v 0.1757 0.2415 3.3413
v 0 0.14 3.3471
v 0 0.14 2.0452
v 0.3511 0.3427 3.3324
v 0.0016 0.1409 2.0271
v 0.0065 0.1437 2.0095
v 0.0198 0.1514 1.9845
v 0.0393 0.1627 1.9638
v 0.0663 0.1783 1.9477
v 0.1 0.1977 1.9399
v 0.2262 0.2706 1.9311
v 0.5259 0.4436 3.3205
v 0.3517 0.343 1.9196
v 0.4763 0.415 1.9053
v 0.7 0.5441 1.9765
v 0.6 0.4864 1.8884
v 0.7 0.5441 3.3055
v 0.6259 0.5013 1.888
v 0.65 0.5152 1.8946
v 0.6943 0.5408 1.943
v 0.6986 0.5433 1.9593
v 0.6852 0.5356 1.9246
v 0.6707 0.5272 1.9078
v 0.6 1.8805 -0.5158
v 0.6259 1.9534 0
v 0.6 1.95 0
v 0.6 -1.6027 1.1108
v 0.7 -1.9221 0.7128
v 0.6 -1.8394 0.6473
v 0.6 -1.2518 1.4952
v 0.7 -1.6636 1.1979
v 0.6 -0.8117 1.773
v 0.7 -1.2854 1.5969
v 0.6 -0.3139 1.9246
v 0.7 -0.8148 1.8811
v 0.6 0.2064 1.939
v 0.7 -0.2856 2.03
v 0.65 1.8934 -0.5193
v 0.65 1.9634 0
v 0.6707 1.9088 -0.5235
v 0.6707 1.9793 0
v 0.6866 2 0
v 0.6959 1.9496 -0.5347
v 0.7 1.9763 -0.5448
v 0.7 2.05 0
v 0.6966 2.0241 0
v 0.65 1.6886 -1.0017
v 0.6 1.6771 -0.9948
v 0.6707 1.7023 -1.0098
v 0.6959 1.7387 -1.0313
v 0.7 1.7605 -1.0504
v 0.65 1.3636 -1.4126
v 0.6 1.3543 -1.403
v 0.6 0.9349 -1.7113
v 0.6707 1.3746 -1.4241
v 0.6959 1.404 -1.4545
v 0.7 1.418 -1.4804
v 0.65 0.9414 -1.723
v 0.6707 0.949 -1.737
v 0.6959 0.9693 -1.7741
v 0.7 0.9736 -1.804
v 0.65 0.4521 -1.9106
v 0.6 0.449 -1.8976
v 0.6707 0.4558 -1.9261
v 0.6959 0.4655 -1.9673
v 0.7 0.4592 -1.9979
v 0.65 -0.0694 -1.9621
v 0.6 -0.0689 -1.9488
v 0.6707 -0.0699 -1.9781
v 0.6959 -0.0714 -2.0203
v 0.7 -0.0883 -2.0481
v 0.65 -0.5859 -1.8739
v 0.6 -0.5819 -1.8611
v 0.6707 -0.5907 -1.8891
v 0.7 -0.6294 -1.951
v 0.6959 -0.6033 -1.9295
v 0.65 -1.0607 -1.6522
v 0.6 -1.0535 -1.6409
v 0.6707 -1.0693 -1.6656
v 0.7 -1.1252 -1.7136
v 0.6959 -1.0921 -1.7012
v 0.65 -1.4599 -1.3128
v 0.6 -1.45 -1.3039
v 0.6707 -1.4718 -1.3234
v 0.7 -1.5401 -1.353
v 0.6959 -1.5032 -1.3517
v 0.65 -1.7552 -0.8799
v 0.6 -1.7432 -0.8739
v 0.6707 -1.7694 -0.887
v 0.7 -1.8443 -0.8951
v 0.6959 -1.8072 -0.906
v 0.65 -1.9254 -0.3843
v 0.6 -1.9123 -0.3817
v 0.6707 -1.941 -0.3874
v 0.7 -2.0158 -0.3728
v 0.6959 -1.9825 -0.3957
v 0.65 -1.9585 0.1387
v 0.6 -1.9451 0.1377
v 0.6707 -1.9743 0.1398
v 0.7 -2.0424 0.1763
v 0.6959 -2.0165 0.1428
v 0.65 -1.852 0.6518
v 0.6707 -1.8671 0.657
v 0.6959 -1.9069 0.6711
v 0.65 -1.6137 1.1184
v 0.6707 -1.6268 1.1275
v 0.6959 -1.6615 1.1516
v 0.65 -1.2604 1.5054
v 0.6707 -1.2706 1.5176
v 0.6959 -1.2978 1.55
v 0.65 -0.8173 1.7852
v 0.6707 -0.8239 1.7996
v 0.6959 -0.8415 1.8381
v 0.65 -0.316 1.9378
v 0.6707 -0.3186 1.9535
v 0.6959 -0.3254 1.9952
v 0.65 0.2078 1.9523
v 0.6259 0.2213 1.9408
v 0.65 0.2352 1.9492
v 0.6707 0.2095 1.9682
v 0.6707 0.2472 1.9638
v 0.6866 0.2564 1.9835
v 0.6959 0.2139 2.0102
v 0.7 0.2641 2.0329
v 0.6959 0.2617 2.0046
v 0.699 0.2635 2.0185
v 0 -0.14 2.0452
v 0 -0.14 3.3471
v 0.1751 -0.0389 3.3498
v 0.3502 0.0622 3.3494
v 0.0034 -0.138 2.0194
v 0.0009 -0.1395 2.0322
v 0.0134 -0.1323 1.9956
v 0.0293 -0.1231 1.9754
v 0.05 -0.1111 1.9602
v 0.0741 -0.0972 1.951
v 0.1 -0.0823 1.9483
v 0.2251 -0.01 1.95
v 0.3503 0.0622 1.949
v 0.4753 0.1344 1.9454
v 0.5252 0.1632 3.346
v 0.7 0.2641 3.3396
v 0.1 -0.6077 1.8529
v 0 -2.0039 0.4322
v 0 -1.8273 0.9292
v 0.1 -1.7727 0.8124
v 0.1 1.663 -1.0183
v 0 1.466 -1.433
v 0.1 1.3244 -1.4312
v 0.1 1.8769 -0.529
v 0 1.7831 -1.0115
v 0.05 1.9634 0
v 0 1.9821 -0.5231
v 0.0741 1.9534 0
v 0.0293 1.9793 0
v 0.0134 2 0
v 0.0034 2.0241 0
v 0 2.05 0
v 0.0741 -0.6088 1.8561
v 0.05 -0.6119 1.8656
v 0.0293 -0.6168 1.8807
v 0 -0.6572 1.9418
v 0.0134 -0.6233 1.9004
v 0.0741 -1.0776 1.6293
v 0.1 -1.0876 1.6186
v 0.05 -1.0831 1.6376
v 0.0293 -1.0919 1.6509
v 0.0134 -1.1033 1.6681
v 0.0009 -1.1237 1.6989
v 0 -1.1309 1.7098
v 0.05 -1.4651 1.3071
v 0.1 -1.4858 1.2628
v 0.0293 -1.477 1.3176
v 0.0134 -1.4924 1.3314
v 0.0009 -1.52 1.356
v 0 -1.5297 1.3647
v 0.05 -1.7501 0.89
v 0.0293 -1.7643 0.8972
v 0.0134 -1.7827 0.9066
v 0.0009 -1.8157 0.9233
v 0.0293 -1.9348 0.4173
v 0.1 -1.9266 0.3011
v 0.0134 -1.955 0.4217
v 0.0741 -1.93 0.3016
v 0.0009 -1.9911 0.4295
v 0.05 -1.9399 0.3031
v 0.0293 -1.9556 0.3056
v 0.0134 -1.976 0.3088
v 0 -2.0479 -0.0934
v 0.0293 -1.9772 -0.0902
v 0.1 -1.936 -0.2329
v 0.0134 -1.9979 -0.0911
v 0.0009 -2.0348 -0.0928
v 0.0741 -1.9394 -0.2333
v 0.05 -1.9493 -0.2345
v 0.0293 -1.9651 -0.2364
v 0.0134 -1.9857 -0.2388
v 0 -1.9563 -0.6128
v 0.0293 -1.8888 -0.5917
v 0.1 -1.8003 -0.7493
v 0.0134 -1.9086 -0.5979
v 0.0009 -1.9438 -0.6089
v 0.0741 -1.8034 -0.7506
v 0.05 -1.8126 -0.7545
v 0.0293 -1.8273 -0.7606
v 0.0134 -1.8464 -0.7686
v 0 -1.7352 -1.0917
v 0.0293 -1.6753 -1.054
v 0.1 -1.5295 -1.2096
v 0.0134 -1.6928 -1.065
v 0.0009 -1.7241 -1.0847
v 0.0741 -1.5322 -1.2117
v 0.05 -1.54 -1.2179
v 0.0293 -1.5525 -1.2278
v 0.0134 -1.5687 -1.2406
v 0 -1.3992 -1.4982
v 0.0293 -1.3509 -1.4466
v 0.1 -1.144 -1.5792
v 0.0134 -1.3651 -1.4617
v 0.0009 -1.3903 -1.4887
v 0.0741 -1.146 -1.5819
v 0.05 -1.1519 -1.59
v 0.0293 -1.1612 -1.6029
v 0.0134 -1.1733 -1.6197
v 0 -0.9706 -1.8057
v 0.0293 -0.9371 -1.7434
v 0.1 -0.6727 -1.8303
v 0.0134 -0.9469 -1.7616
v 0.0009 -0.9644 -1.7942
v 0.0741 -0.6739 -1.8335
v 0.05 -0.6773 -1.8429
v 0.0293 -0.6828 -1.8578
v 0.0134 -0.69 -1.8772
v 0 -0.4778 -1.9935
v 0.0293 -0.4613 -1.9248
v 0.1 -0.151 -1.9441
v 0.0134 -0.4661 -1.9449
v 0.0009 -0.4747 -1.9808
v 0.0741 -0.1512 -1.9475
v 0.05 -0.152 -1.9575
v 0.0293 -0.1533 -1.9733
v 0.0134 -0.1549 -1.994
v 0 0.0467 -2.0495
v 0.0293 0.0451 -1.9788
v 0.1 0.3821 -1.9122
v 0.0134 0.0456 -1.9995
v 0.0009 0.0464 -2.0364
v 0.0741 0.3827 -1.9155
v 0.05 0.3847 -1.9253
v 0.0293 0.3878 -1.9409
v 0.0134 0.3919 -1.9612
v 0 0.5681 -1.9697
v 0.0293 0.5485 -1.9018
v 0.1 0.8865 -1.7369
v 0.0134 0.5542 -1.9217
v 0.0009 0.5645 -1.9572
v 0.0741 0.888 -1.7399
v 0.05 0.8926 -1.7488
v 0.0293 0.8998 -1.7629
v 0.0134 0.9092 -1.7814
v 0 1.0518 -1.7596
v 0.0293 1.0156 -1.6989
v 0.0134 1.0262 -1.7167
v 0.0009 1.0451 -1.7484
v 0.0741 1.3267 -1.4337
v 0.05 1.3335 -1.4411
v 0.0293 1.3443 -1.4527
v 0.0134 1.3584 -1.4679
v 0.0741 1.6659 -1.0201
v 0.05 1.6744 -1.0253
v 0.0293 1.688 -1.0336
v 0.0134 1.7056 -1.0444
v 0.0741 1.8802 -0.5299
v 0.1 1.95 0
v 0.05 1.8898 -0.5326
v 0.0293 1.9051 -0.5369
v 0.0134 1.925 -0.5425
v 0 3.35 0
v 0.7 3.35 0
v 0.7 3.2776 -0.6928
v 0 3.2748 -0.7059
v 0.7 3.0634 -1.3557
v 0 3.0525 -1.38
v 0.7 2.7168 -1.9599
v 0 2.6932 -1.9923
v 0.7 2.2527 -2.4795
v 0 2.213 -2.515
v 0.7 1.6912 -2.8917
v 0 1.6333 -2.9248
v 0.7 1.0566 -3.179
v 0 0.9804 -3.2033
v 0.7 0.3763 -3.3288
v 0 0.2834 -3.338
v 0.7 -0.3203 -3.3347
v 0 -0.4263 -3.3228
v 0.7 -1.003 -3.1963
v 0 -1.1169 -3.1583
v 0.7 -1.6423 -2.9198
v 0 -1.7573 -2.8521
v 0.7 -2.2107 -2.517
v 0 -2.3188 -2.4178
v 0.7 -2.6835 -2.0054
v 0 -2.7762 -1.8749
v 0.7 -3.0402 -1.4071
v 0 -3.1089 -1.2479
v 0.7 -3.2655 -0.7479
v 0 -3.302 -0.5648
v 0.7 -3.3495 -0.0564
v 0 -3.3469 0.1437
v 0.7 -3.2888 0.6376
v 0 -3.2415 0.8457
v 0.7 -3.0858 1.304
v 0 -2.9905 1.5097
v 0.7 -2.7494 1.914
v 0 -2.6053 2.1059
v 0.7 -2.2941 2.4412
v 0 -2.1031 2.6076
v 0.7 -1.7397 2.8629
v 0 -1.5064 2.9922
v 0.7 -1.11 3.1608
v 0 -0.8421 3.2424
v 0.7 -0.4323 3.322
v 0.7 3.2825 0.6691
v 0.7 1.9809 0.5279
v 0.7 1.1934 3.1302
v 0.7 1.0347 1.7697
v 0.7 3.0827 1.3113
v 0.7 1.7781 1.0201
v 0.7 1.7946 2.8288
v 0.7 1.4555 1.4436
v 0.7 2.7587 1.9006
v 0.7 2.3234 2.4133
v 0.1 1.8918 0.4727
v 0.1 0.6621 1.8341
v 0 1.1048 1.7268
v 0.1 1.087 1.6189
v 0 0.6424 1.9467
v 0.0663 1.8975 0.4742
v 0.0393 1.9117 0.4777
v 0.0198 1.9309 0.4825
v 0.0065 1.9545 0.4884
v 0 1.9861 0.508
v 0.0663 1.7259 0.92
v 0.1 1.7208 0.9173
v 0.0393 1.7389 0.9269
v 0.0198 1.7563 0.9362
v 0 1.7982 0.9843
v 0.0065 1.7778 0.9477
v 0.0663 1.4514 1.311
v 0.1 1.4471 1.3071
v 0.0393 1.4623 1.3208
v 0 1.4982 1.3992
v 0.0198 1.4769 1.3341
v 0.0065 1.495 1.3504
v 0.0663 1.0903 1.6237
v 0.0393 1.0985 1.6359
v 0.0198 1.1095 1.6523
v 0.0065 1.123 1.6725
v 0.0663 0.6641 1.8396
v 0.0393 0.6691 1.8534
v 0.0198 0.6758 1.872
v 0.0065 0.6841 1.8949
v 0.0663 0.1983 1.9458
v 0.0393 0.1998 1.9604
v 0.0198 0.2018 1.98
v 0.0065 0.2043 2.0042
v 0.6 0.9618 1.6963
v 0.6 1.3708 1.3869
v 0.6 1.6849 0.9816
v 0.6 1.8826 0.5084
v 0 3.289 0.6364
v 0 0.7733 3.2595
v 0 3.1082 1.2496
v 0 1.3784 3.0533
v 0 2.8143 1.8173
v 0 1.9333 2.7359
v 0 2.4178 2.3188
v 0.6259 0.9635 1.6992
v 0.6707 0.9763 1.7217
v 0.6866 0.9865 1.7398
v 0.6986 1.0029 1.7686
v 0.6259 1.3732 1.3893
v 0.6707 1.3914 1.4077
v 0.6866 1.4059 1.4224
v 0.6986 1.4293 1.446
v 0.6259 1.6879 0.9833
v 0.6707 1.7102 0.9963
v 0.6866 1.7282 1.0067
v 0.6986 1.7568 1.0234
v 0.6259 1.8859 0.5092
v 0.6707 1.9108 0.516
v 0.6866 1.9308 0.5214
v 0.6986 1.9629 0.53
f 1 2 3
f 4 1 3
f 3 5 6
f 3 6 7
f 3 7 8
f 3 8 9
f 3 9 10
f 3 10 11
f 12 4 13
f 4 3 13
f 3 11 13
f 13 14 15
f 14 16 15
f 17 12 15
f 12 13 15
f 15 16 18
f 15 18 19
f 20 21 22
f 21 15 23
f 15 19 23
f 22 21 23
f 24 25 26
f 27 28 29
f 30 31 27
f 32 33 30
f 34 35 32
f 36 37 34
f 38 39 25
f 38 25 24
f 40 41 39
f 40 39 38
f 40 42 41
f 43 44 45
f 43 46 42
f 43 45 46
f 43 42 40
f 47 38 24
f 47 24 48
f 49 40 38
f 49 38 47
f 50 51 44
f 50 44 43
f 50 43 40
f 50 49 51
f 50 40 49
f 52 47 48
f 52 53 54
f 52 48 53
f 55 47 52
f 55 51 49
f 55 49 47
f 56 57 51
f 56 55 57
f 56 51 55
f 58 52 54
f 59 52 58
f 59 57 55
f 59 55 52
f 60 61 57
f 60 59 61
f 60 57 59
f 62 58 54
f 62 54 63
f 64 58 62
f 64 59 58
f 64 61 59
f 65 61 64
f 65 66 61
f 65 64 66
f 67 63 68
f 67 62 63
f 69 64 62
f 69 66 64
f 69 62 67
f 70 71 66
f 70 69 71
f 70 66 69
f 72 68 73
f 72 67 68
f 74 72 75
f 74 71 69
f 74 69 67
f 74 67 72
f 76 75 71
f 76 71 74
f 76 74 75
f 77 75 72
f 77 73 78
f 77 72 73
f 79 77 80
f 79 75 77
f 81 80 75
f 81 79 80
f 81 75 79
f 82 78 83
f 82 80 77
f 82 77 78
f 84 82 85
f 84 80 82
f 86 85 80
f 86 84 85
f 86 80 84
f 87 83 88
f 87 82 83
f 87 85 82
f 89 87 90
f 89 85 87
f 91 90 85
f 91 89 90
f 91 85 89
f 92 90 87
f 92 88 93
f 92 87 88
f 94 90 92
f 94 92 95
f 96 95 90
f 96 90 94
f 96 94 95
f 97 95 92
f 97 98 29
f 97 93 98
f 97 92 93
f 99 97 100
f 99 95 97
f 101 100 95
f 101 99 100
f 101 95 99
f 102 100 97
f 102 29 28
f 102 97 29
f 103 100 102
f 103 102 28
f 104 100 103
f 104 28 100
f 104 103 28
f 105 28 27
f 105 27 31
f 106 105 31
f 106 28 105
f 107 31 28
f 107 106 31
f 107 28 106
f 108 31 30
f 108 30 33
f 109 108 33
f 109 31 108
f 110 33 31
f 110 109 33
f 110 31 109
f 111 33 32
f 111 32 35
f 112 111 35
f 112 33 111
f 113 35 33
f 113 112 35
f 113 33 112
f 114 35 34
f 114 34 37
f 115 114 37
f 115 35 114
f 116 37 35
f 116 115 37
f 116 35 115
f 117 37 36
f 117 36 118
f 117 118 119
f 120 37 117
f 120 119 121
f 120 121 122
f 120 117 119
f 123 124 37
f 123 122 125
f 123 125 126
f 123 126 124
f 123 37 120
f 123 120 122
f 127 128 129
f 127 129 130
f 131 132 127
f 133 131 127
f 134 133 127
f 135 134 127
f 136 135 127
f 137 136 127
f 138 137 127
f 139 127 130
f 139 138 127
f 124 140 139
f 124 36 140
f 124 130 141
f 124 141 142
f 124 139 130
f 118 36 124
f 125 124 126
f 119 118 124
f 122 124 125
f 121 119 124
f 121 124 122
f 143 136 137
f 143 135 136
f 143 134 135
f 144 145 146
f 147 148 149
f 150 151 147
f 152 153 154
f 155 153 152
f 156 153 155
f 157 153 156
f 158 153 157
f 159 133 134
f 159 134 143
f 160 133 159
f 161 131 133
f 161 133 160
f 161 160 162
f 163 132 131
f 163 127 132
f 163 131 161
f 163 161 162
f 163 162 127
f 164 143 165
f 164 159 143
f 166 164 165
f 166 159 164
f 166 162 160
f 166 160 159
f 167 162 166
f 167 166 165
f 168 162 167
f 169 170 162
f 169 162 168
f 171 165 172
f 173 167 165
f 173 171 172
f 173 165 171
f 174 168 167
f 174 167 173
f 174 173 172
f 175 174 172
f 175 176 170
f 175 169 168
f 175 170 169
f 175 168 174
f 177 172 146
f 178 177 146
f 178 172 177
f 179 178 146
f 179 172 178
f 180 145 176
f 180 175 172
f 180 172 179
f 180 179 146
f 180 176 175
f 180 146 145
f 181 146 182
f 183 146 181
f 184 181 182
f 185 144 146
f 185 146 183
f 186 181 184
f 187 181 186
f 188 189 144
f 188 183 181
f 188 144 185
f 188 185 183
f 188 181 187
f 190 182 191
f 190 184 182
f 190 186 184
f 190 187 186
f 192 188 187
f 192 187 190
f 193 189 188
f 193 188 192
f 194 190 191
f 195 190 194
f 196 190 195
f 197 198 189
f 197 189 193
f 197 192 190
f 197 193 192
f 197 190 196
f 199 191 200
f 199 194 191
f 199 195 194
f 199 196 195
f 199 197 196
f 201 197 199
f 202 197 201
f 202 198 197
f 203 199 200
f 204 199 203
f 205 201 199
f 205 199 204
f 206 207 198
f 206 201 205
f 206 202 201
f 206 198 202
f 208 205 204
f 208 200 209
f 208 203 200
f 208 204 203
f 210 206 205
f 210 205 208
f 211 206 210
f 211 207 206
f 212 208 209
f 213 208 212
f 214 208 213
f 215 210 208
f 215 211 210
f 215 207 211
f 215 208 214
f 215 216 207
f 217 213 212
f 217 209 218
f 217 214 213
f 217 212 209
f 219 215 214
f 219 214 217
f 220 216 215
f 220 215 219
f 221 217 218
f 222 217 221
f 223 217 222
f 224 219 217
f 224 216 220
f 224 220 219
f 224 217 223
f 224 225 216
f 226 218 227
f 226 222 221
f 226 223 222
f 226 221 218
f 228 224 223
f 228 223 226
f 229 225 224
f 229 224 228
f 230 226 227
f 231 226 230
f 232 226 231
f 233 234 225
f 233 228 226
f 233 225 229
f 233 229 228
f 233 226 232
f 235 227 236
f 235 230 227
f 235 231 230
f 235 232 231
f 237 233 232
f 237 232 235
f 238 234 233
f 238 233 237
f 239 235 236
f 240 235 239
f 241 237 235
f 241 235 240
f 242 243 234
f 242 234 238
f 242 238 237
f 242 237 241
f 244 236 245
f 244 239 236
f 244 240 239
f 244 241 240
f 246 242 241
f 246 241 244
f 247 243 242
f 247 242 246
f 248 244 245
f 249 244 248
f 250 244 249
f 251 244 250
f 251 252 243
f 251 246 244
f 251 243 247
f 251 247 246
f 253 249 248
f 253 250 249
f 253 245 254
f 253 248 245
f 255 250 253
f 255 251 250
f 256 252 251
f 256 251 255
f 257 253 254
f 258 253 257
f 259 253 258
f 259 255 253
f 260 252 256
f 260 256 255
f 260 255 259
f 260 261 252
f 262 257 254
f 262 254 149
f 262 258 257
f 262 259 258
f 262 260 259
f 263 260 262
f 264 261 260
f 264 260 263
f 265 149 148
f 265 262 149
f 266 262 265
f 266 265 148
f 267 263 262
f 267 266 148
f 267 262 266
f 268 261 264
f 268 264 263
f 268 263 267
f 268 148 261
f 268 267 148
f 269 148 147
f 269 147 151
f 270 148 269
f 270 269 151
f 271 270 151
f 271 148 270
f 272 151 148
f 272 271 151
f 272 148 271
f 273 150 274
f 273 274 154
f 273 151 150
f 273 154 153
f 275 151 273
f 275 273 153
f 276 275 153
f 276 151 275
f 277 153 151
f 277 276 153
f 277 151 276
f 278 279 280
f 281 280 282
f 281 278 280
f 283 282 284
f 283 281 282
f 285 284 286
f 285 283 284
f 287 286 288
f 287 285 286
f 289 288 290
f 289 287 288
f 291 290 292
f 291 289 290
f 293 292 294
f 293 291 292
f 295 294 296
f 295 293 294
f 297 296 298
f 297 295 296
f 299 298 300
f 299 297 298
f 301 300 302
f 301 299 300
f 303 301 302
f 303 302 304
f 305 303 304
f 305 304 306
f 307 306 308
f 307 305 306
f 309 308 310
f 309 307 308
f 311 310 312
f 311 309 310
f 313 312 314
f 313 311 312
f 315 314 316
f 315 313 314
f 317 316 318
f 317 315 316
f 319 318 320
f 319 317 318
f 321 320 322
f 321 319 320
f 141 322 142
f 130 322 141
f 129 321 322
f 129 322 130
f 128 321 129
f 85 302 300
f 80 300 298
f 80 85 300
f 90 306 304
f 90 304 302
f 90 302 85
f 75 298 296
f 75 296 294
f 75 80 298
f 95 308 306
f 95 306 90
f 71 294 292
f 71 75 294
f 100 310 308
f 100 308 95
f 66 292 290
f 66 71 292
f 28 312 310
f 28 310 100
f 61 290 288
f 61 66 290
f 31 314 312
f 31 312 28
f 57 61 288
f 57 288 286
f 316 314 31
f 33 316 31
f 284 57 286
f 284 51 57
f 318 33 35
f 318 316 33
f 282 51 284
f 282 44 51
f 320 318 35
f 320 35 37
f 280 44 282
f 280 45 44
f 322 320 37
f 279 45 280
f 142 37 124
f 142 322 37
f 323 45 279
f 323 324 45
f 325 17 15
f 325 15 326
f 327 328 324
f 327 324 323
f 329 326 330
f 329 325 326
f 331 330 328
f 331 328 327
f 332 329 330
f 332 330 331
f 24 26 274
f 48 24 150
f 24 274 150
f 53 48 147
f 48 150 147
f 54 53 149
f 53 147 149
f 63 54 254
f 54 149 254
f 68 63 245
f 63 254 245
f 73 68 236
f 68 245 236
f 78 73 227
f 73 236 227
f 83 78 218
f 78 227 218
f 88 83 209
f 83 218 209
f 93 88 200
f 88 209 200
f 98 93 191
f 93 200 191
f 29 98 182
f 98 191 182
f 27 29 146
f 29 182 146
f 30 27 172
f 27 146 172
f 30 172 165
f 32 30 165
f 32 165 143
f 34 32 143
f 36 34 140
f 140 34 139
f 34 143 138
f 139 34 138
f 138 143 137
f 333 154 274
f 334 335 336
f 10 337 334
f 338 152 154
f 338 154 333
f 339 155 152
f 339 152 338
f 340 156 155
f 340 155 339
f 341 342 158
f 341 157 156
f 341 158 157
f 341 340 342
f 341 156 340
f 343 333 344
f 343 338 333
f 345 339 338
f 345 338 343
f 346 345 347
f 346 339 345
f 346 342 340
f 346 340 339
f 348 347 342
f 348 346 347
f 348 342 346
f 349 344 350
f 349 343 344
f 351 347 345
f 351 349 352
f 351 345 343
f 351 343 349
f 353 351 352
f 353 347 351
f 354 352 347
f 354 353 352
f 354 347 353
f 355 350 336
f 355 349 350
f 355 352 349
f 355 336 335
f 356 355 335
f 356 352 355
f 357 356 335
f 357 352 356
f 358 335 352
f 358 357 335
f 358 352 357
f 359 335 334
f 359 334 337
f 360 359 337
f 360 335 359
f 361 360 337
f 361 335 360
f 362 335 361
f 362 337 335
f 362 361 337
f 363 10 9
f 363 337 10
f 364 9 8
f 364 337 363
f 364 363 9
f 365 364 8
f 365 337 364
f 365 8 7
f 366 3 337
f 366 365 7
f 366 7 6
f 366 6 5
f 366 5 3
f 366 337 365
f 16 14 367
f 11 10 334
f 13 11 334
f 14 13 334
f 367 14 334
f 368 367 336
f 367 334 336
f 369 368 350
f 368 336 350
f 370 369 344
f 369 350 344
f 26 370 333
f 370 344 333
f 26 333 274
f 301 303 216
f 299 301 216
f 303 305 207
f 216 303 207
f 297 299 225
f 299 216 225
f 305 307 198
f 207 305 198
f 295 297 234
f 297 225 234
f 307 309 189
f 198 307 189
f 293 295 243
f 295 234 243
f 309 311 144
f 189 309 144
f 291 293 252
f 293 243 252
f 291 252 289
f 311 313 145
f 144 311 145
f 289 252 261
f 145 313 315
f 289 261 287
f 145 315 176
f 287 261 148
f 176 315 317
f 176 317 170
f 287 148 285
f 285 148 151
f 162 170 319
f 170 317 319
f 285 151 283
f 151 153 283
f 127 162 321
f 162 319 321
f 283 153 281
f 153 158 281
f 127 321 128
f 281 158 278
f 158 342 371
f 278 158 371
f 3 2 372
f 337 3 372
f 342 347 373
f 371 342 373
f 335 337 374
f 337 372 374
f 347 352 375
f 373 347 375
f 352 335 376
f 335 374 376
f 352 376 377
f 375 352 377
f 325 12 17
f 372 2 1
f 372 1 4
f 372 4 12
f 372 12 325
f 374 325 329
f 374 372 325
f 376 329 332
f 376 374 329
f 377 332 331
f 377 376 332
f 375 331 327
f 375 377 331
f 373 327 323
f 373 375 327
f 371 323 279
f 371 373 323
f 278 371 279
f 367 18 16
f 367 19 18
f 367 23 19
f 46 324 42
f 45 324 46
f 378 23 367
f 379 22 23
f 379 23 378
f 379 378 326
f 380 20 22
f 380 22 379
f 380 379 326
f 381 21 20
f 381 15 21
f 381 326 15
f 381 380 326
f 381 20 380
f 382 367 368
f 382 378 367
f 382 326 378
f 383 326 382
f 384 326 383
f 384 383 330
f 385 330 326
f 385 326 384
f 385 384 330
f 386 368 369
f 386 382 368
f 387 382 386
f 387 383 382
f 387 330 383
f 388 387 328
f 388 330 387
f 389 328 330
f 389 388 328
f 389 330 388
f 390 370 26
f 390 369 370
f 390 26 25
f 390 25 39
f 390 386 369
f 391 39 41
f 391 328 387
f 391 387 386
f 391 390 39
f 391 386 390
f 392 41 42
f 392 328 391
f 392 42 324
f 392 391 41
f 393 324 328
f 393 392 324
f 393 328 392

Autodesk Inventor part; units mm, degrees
ref_plane "YZ Plane" through (0, 0, 0) normal (1, 0, 0) x (0, 1, 0)
ref_plane "XZ Plane" through (0, 0, 0) normal (0, 1, 0) x (-1, 0, 0)
sketch "Sketch1" plane through (0, 0, 0) normal (1, 0, 0) x (0, 1, 0)
  circle A0 centre (0, 0) radius 3.35
  circle A1 centre (0, 0) radius 1.95
  dimension "d0" = 3.9
  dimension "d1" = 6.7
extrude "Body" add sketch "Sketch1" along normal blind 0.7
fillet "Fillet" radius 0.1 2 edges at (0.7, -1.95, 0) (0, -1.95, 0)
sketch "Sketch2" plane through (0, 0, 0) normal (0, 0, 1) x (1, 0, 0)
  line L0 (0, -1.95) -> (0, 1.95) projected
  line L1 (0.7, 3.35) -> (0.7, -3.35) projected
  line L2 (-1.2, 0) -> (7.2, 0) projected
  line L3 (0, -0.14) -> (0.7, 0.2641)
  line L4 (0, 0.14) -> (0.7, 0.5441)
  dimension "d4" = 0.14
  dimension "d5" = 0.14
  dimension "d6" = 60
extrude "Cut" cut sketch "Sketch2" along normal up to next contours L0 L2 L3 | L0 L4 L1 L3 L2
ref_plane "Work Plane1" through (0, 0, 0) normal (0, -1, 0) x (1, 0, 0)
equation "\"d0\" = SD1"
equation "\"d1\" = SD2"
equation "\"d2\" = SD"
equation "\"d4\" = 0.2 * SD"
equation "\"d5\" = 0.2 * SD"
equation "\"d6\" = FAWI"
equation "\"d7\" = SD"
equation "\"d13\" = R"
equation "\"SD1\" = 3.9"
equation "\"SD2\" = 6.7"
equation "\"SD\" = 0.7"
equation "\"FAWI\" = 60deg"
equation "\"R\" = 0.1"
equation "\"NND\" = 3.5"
properties part number "DIN 128 - A3.5" material "Steel, Mild"
